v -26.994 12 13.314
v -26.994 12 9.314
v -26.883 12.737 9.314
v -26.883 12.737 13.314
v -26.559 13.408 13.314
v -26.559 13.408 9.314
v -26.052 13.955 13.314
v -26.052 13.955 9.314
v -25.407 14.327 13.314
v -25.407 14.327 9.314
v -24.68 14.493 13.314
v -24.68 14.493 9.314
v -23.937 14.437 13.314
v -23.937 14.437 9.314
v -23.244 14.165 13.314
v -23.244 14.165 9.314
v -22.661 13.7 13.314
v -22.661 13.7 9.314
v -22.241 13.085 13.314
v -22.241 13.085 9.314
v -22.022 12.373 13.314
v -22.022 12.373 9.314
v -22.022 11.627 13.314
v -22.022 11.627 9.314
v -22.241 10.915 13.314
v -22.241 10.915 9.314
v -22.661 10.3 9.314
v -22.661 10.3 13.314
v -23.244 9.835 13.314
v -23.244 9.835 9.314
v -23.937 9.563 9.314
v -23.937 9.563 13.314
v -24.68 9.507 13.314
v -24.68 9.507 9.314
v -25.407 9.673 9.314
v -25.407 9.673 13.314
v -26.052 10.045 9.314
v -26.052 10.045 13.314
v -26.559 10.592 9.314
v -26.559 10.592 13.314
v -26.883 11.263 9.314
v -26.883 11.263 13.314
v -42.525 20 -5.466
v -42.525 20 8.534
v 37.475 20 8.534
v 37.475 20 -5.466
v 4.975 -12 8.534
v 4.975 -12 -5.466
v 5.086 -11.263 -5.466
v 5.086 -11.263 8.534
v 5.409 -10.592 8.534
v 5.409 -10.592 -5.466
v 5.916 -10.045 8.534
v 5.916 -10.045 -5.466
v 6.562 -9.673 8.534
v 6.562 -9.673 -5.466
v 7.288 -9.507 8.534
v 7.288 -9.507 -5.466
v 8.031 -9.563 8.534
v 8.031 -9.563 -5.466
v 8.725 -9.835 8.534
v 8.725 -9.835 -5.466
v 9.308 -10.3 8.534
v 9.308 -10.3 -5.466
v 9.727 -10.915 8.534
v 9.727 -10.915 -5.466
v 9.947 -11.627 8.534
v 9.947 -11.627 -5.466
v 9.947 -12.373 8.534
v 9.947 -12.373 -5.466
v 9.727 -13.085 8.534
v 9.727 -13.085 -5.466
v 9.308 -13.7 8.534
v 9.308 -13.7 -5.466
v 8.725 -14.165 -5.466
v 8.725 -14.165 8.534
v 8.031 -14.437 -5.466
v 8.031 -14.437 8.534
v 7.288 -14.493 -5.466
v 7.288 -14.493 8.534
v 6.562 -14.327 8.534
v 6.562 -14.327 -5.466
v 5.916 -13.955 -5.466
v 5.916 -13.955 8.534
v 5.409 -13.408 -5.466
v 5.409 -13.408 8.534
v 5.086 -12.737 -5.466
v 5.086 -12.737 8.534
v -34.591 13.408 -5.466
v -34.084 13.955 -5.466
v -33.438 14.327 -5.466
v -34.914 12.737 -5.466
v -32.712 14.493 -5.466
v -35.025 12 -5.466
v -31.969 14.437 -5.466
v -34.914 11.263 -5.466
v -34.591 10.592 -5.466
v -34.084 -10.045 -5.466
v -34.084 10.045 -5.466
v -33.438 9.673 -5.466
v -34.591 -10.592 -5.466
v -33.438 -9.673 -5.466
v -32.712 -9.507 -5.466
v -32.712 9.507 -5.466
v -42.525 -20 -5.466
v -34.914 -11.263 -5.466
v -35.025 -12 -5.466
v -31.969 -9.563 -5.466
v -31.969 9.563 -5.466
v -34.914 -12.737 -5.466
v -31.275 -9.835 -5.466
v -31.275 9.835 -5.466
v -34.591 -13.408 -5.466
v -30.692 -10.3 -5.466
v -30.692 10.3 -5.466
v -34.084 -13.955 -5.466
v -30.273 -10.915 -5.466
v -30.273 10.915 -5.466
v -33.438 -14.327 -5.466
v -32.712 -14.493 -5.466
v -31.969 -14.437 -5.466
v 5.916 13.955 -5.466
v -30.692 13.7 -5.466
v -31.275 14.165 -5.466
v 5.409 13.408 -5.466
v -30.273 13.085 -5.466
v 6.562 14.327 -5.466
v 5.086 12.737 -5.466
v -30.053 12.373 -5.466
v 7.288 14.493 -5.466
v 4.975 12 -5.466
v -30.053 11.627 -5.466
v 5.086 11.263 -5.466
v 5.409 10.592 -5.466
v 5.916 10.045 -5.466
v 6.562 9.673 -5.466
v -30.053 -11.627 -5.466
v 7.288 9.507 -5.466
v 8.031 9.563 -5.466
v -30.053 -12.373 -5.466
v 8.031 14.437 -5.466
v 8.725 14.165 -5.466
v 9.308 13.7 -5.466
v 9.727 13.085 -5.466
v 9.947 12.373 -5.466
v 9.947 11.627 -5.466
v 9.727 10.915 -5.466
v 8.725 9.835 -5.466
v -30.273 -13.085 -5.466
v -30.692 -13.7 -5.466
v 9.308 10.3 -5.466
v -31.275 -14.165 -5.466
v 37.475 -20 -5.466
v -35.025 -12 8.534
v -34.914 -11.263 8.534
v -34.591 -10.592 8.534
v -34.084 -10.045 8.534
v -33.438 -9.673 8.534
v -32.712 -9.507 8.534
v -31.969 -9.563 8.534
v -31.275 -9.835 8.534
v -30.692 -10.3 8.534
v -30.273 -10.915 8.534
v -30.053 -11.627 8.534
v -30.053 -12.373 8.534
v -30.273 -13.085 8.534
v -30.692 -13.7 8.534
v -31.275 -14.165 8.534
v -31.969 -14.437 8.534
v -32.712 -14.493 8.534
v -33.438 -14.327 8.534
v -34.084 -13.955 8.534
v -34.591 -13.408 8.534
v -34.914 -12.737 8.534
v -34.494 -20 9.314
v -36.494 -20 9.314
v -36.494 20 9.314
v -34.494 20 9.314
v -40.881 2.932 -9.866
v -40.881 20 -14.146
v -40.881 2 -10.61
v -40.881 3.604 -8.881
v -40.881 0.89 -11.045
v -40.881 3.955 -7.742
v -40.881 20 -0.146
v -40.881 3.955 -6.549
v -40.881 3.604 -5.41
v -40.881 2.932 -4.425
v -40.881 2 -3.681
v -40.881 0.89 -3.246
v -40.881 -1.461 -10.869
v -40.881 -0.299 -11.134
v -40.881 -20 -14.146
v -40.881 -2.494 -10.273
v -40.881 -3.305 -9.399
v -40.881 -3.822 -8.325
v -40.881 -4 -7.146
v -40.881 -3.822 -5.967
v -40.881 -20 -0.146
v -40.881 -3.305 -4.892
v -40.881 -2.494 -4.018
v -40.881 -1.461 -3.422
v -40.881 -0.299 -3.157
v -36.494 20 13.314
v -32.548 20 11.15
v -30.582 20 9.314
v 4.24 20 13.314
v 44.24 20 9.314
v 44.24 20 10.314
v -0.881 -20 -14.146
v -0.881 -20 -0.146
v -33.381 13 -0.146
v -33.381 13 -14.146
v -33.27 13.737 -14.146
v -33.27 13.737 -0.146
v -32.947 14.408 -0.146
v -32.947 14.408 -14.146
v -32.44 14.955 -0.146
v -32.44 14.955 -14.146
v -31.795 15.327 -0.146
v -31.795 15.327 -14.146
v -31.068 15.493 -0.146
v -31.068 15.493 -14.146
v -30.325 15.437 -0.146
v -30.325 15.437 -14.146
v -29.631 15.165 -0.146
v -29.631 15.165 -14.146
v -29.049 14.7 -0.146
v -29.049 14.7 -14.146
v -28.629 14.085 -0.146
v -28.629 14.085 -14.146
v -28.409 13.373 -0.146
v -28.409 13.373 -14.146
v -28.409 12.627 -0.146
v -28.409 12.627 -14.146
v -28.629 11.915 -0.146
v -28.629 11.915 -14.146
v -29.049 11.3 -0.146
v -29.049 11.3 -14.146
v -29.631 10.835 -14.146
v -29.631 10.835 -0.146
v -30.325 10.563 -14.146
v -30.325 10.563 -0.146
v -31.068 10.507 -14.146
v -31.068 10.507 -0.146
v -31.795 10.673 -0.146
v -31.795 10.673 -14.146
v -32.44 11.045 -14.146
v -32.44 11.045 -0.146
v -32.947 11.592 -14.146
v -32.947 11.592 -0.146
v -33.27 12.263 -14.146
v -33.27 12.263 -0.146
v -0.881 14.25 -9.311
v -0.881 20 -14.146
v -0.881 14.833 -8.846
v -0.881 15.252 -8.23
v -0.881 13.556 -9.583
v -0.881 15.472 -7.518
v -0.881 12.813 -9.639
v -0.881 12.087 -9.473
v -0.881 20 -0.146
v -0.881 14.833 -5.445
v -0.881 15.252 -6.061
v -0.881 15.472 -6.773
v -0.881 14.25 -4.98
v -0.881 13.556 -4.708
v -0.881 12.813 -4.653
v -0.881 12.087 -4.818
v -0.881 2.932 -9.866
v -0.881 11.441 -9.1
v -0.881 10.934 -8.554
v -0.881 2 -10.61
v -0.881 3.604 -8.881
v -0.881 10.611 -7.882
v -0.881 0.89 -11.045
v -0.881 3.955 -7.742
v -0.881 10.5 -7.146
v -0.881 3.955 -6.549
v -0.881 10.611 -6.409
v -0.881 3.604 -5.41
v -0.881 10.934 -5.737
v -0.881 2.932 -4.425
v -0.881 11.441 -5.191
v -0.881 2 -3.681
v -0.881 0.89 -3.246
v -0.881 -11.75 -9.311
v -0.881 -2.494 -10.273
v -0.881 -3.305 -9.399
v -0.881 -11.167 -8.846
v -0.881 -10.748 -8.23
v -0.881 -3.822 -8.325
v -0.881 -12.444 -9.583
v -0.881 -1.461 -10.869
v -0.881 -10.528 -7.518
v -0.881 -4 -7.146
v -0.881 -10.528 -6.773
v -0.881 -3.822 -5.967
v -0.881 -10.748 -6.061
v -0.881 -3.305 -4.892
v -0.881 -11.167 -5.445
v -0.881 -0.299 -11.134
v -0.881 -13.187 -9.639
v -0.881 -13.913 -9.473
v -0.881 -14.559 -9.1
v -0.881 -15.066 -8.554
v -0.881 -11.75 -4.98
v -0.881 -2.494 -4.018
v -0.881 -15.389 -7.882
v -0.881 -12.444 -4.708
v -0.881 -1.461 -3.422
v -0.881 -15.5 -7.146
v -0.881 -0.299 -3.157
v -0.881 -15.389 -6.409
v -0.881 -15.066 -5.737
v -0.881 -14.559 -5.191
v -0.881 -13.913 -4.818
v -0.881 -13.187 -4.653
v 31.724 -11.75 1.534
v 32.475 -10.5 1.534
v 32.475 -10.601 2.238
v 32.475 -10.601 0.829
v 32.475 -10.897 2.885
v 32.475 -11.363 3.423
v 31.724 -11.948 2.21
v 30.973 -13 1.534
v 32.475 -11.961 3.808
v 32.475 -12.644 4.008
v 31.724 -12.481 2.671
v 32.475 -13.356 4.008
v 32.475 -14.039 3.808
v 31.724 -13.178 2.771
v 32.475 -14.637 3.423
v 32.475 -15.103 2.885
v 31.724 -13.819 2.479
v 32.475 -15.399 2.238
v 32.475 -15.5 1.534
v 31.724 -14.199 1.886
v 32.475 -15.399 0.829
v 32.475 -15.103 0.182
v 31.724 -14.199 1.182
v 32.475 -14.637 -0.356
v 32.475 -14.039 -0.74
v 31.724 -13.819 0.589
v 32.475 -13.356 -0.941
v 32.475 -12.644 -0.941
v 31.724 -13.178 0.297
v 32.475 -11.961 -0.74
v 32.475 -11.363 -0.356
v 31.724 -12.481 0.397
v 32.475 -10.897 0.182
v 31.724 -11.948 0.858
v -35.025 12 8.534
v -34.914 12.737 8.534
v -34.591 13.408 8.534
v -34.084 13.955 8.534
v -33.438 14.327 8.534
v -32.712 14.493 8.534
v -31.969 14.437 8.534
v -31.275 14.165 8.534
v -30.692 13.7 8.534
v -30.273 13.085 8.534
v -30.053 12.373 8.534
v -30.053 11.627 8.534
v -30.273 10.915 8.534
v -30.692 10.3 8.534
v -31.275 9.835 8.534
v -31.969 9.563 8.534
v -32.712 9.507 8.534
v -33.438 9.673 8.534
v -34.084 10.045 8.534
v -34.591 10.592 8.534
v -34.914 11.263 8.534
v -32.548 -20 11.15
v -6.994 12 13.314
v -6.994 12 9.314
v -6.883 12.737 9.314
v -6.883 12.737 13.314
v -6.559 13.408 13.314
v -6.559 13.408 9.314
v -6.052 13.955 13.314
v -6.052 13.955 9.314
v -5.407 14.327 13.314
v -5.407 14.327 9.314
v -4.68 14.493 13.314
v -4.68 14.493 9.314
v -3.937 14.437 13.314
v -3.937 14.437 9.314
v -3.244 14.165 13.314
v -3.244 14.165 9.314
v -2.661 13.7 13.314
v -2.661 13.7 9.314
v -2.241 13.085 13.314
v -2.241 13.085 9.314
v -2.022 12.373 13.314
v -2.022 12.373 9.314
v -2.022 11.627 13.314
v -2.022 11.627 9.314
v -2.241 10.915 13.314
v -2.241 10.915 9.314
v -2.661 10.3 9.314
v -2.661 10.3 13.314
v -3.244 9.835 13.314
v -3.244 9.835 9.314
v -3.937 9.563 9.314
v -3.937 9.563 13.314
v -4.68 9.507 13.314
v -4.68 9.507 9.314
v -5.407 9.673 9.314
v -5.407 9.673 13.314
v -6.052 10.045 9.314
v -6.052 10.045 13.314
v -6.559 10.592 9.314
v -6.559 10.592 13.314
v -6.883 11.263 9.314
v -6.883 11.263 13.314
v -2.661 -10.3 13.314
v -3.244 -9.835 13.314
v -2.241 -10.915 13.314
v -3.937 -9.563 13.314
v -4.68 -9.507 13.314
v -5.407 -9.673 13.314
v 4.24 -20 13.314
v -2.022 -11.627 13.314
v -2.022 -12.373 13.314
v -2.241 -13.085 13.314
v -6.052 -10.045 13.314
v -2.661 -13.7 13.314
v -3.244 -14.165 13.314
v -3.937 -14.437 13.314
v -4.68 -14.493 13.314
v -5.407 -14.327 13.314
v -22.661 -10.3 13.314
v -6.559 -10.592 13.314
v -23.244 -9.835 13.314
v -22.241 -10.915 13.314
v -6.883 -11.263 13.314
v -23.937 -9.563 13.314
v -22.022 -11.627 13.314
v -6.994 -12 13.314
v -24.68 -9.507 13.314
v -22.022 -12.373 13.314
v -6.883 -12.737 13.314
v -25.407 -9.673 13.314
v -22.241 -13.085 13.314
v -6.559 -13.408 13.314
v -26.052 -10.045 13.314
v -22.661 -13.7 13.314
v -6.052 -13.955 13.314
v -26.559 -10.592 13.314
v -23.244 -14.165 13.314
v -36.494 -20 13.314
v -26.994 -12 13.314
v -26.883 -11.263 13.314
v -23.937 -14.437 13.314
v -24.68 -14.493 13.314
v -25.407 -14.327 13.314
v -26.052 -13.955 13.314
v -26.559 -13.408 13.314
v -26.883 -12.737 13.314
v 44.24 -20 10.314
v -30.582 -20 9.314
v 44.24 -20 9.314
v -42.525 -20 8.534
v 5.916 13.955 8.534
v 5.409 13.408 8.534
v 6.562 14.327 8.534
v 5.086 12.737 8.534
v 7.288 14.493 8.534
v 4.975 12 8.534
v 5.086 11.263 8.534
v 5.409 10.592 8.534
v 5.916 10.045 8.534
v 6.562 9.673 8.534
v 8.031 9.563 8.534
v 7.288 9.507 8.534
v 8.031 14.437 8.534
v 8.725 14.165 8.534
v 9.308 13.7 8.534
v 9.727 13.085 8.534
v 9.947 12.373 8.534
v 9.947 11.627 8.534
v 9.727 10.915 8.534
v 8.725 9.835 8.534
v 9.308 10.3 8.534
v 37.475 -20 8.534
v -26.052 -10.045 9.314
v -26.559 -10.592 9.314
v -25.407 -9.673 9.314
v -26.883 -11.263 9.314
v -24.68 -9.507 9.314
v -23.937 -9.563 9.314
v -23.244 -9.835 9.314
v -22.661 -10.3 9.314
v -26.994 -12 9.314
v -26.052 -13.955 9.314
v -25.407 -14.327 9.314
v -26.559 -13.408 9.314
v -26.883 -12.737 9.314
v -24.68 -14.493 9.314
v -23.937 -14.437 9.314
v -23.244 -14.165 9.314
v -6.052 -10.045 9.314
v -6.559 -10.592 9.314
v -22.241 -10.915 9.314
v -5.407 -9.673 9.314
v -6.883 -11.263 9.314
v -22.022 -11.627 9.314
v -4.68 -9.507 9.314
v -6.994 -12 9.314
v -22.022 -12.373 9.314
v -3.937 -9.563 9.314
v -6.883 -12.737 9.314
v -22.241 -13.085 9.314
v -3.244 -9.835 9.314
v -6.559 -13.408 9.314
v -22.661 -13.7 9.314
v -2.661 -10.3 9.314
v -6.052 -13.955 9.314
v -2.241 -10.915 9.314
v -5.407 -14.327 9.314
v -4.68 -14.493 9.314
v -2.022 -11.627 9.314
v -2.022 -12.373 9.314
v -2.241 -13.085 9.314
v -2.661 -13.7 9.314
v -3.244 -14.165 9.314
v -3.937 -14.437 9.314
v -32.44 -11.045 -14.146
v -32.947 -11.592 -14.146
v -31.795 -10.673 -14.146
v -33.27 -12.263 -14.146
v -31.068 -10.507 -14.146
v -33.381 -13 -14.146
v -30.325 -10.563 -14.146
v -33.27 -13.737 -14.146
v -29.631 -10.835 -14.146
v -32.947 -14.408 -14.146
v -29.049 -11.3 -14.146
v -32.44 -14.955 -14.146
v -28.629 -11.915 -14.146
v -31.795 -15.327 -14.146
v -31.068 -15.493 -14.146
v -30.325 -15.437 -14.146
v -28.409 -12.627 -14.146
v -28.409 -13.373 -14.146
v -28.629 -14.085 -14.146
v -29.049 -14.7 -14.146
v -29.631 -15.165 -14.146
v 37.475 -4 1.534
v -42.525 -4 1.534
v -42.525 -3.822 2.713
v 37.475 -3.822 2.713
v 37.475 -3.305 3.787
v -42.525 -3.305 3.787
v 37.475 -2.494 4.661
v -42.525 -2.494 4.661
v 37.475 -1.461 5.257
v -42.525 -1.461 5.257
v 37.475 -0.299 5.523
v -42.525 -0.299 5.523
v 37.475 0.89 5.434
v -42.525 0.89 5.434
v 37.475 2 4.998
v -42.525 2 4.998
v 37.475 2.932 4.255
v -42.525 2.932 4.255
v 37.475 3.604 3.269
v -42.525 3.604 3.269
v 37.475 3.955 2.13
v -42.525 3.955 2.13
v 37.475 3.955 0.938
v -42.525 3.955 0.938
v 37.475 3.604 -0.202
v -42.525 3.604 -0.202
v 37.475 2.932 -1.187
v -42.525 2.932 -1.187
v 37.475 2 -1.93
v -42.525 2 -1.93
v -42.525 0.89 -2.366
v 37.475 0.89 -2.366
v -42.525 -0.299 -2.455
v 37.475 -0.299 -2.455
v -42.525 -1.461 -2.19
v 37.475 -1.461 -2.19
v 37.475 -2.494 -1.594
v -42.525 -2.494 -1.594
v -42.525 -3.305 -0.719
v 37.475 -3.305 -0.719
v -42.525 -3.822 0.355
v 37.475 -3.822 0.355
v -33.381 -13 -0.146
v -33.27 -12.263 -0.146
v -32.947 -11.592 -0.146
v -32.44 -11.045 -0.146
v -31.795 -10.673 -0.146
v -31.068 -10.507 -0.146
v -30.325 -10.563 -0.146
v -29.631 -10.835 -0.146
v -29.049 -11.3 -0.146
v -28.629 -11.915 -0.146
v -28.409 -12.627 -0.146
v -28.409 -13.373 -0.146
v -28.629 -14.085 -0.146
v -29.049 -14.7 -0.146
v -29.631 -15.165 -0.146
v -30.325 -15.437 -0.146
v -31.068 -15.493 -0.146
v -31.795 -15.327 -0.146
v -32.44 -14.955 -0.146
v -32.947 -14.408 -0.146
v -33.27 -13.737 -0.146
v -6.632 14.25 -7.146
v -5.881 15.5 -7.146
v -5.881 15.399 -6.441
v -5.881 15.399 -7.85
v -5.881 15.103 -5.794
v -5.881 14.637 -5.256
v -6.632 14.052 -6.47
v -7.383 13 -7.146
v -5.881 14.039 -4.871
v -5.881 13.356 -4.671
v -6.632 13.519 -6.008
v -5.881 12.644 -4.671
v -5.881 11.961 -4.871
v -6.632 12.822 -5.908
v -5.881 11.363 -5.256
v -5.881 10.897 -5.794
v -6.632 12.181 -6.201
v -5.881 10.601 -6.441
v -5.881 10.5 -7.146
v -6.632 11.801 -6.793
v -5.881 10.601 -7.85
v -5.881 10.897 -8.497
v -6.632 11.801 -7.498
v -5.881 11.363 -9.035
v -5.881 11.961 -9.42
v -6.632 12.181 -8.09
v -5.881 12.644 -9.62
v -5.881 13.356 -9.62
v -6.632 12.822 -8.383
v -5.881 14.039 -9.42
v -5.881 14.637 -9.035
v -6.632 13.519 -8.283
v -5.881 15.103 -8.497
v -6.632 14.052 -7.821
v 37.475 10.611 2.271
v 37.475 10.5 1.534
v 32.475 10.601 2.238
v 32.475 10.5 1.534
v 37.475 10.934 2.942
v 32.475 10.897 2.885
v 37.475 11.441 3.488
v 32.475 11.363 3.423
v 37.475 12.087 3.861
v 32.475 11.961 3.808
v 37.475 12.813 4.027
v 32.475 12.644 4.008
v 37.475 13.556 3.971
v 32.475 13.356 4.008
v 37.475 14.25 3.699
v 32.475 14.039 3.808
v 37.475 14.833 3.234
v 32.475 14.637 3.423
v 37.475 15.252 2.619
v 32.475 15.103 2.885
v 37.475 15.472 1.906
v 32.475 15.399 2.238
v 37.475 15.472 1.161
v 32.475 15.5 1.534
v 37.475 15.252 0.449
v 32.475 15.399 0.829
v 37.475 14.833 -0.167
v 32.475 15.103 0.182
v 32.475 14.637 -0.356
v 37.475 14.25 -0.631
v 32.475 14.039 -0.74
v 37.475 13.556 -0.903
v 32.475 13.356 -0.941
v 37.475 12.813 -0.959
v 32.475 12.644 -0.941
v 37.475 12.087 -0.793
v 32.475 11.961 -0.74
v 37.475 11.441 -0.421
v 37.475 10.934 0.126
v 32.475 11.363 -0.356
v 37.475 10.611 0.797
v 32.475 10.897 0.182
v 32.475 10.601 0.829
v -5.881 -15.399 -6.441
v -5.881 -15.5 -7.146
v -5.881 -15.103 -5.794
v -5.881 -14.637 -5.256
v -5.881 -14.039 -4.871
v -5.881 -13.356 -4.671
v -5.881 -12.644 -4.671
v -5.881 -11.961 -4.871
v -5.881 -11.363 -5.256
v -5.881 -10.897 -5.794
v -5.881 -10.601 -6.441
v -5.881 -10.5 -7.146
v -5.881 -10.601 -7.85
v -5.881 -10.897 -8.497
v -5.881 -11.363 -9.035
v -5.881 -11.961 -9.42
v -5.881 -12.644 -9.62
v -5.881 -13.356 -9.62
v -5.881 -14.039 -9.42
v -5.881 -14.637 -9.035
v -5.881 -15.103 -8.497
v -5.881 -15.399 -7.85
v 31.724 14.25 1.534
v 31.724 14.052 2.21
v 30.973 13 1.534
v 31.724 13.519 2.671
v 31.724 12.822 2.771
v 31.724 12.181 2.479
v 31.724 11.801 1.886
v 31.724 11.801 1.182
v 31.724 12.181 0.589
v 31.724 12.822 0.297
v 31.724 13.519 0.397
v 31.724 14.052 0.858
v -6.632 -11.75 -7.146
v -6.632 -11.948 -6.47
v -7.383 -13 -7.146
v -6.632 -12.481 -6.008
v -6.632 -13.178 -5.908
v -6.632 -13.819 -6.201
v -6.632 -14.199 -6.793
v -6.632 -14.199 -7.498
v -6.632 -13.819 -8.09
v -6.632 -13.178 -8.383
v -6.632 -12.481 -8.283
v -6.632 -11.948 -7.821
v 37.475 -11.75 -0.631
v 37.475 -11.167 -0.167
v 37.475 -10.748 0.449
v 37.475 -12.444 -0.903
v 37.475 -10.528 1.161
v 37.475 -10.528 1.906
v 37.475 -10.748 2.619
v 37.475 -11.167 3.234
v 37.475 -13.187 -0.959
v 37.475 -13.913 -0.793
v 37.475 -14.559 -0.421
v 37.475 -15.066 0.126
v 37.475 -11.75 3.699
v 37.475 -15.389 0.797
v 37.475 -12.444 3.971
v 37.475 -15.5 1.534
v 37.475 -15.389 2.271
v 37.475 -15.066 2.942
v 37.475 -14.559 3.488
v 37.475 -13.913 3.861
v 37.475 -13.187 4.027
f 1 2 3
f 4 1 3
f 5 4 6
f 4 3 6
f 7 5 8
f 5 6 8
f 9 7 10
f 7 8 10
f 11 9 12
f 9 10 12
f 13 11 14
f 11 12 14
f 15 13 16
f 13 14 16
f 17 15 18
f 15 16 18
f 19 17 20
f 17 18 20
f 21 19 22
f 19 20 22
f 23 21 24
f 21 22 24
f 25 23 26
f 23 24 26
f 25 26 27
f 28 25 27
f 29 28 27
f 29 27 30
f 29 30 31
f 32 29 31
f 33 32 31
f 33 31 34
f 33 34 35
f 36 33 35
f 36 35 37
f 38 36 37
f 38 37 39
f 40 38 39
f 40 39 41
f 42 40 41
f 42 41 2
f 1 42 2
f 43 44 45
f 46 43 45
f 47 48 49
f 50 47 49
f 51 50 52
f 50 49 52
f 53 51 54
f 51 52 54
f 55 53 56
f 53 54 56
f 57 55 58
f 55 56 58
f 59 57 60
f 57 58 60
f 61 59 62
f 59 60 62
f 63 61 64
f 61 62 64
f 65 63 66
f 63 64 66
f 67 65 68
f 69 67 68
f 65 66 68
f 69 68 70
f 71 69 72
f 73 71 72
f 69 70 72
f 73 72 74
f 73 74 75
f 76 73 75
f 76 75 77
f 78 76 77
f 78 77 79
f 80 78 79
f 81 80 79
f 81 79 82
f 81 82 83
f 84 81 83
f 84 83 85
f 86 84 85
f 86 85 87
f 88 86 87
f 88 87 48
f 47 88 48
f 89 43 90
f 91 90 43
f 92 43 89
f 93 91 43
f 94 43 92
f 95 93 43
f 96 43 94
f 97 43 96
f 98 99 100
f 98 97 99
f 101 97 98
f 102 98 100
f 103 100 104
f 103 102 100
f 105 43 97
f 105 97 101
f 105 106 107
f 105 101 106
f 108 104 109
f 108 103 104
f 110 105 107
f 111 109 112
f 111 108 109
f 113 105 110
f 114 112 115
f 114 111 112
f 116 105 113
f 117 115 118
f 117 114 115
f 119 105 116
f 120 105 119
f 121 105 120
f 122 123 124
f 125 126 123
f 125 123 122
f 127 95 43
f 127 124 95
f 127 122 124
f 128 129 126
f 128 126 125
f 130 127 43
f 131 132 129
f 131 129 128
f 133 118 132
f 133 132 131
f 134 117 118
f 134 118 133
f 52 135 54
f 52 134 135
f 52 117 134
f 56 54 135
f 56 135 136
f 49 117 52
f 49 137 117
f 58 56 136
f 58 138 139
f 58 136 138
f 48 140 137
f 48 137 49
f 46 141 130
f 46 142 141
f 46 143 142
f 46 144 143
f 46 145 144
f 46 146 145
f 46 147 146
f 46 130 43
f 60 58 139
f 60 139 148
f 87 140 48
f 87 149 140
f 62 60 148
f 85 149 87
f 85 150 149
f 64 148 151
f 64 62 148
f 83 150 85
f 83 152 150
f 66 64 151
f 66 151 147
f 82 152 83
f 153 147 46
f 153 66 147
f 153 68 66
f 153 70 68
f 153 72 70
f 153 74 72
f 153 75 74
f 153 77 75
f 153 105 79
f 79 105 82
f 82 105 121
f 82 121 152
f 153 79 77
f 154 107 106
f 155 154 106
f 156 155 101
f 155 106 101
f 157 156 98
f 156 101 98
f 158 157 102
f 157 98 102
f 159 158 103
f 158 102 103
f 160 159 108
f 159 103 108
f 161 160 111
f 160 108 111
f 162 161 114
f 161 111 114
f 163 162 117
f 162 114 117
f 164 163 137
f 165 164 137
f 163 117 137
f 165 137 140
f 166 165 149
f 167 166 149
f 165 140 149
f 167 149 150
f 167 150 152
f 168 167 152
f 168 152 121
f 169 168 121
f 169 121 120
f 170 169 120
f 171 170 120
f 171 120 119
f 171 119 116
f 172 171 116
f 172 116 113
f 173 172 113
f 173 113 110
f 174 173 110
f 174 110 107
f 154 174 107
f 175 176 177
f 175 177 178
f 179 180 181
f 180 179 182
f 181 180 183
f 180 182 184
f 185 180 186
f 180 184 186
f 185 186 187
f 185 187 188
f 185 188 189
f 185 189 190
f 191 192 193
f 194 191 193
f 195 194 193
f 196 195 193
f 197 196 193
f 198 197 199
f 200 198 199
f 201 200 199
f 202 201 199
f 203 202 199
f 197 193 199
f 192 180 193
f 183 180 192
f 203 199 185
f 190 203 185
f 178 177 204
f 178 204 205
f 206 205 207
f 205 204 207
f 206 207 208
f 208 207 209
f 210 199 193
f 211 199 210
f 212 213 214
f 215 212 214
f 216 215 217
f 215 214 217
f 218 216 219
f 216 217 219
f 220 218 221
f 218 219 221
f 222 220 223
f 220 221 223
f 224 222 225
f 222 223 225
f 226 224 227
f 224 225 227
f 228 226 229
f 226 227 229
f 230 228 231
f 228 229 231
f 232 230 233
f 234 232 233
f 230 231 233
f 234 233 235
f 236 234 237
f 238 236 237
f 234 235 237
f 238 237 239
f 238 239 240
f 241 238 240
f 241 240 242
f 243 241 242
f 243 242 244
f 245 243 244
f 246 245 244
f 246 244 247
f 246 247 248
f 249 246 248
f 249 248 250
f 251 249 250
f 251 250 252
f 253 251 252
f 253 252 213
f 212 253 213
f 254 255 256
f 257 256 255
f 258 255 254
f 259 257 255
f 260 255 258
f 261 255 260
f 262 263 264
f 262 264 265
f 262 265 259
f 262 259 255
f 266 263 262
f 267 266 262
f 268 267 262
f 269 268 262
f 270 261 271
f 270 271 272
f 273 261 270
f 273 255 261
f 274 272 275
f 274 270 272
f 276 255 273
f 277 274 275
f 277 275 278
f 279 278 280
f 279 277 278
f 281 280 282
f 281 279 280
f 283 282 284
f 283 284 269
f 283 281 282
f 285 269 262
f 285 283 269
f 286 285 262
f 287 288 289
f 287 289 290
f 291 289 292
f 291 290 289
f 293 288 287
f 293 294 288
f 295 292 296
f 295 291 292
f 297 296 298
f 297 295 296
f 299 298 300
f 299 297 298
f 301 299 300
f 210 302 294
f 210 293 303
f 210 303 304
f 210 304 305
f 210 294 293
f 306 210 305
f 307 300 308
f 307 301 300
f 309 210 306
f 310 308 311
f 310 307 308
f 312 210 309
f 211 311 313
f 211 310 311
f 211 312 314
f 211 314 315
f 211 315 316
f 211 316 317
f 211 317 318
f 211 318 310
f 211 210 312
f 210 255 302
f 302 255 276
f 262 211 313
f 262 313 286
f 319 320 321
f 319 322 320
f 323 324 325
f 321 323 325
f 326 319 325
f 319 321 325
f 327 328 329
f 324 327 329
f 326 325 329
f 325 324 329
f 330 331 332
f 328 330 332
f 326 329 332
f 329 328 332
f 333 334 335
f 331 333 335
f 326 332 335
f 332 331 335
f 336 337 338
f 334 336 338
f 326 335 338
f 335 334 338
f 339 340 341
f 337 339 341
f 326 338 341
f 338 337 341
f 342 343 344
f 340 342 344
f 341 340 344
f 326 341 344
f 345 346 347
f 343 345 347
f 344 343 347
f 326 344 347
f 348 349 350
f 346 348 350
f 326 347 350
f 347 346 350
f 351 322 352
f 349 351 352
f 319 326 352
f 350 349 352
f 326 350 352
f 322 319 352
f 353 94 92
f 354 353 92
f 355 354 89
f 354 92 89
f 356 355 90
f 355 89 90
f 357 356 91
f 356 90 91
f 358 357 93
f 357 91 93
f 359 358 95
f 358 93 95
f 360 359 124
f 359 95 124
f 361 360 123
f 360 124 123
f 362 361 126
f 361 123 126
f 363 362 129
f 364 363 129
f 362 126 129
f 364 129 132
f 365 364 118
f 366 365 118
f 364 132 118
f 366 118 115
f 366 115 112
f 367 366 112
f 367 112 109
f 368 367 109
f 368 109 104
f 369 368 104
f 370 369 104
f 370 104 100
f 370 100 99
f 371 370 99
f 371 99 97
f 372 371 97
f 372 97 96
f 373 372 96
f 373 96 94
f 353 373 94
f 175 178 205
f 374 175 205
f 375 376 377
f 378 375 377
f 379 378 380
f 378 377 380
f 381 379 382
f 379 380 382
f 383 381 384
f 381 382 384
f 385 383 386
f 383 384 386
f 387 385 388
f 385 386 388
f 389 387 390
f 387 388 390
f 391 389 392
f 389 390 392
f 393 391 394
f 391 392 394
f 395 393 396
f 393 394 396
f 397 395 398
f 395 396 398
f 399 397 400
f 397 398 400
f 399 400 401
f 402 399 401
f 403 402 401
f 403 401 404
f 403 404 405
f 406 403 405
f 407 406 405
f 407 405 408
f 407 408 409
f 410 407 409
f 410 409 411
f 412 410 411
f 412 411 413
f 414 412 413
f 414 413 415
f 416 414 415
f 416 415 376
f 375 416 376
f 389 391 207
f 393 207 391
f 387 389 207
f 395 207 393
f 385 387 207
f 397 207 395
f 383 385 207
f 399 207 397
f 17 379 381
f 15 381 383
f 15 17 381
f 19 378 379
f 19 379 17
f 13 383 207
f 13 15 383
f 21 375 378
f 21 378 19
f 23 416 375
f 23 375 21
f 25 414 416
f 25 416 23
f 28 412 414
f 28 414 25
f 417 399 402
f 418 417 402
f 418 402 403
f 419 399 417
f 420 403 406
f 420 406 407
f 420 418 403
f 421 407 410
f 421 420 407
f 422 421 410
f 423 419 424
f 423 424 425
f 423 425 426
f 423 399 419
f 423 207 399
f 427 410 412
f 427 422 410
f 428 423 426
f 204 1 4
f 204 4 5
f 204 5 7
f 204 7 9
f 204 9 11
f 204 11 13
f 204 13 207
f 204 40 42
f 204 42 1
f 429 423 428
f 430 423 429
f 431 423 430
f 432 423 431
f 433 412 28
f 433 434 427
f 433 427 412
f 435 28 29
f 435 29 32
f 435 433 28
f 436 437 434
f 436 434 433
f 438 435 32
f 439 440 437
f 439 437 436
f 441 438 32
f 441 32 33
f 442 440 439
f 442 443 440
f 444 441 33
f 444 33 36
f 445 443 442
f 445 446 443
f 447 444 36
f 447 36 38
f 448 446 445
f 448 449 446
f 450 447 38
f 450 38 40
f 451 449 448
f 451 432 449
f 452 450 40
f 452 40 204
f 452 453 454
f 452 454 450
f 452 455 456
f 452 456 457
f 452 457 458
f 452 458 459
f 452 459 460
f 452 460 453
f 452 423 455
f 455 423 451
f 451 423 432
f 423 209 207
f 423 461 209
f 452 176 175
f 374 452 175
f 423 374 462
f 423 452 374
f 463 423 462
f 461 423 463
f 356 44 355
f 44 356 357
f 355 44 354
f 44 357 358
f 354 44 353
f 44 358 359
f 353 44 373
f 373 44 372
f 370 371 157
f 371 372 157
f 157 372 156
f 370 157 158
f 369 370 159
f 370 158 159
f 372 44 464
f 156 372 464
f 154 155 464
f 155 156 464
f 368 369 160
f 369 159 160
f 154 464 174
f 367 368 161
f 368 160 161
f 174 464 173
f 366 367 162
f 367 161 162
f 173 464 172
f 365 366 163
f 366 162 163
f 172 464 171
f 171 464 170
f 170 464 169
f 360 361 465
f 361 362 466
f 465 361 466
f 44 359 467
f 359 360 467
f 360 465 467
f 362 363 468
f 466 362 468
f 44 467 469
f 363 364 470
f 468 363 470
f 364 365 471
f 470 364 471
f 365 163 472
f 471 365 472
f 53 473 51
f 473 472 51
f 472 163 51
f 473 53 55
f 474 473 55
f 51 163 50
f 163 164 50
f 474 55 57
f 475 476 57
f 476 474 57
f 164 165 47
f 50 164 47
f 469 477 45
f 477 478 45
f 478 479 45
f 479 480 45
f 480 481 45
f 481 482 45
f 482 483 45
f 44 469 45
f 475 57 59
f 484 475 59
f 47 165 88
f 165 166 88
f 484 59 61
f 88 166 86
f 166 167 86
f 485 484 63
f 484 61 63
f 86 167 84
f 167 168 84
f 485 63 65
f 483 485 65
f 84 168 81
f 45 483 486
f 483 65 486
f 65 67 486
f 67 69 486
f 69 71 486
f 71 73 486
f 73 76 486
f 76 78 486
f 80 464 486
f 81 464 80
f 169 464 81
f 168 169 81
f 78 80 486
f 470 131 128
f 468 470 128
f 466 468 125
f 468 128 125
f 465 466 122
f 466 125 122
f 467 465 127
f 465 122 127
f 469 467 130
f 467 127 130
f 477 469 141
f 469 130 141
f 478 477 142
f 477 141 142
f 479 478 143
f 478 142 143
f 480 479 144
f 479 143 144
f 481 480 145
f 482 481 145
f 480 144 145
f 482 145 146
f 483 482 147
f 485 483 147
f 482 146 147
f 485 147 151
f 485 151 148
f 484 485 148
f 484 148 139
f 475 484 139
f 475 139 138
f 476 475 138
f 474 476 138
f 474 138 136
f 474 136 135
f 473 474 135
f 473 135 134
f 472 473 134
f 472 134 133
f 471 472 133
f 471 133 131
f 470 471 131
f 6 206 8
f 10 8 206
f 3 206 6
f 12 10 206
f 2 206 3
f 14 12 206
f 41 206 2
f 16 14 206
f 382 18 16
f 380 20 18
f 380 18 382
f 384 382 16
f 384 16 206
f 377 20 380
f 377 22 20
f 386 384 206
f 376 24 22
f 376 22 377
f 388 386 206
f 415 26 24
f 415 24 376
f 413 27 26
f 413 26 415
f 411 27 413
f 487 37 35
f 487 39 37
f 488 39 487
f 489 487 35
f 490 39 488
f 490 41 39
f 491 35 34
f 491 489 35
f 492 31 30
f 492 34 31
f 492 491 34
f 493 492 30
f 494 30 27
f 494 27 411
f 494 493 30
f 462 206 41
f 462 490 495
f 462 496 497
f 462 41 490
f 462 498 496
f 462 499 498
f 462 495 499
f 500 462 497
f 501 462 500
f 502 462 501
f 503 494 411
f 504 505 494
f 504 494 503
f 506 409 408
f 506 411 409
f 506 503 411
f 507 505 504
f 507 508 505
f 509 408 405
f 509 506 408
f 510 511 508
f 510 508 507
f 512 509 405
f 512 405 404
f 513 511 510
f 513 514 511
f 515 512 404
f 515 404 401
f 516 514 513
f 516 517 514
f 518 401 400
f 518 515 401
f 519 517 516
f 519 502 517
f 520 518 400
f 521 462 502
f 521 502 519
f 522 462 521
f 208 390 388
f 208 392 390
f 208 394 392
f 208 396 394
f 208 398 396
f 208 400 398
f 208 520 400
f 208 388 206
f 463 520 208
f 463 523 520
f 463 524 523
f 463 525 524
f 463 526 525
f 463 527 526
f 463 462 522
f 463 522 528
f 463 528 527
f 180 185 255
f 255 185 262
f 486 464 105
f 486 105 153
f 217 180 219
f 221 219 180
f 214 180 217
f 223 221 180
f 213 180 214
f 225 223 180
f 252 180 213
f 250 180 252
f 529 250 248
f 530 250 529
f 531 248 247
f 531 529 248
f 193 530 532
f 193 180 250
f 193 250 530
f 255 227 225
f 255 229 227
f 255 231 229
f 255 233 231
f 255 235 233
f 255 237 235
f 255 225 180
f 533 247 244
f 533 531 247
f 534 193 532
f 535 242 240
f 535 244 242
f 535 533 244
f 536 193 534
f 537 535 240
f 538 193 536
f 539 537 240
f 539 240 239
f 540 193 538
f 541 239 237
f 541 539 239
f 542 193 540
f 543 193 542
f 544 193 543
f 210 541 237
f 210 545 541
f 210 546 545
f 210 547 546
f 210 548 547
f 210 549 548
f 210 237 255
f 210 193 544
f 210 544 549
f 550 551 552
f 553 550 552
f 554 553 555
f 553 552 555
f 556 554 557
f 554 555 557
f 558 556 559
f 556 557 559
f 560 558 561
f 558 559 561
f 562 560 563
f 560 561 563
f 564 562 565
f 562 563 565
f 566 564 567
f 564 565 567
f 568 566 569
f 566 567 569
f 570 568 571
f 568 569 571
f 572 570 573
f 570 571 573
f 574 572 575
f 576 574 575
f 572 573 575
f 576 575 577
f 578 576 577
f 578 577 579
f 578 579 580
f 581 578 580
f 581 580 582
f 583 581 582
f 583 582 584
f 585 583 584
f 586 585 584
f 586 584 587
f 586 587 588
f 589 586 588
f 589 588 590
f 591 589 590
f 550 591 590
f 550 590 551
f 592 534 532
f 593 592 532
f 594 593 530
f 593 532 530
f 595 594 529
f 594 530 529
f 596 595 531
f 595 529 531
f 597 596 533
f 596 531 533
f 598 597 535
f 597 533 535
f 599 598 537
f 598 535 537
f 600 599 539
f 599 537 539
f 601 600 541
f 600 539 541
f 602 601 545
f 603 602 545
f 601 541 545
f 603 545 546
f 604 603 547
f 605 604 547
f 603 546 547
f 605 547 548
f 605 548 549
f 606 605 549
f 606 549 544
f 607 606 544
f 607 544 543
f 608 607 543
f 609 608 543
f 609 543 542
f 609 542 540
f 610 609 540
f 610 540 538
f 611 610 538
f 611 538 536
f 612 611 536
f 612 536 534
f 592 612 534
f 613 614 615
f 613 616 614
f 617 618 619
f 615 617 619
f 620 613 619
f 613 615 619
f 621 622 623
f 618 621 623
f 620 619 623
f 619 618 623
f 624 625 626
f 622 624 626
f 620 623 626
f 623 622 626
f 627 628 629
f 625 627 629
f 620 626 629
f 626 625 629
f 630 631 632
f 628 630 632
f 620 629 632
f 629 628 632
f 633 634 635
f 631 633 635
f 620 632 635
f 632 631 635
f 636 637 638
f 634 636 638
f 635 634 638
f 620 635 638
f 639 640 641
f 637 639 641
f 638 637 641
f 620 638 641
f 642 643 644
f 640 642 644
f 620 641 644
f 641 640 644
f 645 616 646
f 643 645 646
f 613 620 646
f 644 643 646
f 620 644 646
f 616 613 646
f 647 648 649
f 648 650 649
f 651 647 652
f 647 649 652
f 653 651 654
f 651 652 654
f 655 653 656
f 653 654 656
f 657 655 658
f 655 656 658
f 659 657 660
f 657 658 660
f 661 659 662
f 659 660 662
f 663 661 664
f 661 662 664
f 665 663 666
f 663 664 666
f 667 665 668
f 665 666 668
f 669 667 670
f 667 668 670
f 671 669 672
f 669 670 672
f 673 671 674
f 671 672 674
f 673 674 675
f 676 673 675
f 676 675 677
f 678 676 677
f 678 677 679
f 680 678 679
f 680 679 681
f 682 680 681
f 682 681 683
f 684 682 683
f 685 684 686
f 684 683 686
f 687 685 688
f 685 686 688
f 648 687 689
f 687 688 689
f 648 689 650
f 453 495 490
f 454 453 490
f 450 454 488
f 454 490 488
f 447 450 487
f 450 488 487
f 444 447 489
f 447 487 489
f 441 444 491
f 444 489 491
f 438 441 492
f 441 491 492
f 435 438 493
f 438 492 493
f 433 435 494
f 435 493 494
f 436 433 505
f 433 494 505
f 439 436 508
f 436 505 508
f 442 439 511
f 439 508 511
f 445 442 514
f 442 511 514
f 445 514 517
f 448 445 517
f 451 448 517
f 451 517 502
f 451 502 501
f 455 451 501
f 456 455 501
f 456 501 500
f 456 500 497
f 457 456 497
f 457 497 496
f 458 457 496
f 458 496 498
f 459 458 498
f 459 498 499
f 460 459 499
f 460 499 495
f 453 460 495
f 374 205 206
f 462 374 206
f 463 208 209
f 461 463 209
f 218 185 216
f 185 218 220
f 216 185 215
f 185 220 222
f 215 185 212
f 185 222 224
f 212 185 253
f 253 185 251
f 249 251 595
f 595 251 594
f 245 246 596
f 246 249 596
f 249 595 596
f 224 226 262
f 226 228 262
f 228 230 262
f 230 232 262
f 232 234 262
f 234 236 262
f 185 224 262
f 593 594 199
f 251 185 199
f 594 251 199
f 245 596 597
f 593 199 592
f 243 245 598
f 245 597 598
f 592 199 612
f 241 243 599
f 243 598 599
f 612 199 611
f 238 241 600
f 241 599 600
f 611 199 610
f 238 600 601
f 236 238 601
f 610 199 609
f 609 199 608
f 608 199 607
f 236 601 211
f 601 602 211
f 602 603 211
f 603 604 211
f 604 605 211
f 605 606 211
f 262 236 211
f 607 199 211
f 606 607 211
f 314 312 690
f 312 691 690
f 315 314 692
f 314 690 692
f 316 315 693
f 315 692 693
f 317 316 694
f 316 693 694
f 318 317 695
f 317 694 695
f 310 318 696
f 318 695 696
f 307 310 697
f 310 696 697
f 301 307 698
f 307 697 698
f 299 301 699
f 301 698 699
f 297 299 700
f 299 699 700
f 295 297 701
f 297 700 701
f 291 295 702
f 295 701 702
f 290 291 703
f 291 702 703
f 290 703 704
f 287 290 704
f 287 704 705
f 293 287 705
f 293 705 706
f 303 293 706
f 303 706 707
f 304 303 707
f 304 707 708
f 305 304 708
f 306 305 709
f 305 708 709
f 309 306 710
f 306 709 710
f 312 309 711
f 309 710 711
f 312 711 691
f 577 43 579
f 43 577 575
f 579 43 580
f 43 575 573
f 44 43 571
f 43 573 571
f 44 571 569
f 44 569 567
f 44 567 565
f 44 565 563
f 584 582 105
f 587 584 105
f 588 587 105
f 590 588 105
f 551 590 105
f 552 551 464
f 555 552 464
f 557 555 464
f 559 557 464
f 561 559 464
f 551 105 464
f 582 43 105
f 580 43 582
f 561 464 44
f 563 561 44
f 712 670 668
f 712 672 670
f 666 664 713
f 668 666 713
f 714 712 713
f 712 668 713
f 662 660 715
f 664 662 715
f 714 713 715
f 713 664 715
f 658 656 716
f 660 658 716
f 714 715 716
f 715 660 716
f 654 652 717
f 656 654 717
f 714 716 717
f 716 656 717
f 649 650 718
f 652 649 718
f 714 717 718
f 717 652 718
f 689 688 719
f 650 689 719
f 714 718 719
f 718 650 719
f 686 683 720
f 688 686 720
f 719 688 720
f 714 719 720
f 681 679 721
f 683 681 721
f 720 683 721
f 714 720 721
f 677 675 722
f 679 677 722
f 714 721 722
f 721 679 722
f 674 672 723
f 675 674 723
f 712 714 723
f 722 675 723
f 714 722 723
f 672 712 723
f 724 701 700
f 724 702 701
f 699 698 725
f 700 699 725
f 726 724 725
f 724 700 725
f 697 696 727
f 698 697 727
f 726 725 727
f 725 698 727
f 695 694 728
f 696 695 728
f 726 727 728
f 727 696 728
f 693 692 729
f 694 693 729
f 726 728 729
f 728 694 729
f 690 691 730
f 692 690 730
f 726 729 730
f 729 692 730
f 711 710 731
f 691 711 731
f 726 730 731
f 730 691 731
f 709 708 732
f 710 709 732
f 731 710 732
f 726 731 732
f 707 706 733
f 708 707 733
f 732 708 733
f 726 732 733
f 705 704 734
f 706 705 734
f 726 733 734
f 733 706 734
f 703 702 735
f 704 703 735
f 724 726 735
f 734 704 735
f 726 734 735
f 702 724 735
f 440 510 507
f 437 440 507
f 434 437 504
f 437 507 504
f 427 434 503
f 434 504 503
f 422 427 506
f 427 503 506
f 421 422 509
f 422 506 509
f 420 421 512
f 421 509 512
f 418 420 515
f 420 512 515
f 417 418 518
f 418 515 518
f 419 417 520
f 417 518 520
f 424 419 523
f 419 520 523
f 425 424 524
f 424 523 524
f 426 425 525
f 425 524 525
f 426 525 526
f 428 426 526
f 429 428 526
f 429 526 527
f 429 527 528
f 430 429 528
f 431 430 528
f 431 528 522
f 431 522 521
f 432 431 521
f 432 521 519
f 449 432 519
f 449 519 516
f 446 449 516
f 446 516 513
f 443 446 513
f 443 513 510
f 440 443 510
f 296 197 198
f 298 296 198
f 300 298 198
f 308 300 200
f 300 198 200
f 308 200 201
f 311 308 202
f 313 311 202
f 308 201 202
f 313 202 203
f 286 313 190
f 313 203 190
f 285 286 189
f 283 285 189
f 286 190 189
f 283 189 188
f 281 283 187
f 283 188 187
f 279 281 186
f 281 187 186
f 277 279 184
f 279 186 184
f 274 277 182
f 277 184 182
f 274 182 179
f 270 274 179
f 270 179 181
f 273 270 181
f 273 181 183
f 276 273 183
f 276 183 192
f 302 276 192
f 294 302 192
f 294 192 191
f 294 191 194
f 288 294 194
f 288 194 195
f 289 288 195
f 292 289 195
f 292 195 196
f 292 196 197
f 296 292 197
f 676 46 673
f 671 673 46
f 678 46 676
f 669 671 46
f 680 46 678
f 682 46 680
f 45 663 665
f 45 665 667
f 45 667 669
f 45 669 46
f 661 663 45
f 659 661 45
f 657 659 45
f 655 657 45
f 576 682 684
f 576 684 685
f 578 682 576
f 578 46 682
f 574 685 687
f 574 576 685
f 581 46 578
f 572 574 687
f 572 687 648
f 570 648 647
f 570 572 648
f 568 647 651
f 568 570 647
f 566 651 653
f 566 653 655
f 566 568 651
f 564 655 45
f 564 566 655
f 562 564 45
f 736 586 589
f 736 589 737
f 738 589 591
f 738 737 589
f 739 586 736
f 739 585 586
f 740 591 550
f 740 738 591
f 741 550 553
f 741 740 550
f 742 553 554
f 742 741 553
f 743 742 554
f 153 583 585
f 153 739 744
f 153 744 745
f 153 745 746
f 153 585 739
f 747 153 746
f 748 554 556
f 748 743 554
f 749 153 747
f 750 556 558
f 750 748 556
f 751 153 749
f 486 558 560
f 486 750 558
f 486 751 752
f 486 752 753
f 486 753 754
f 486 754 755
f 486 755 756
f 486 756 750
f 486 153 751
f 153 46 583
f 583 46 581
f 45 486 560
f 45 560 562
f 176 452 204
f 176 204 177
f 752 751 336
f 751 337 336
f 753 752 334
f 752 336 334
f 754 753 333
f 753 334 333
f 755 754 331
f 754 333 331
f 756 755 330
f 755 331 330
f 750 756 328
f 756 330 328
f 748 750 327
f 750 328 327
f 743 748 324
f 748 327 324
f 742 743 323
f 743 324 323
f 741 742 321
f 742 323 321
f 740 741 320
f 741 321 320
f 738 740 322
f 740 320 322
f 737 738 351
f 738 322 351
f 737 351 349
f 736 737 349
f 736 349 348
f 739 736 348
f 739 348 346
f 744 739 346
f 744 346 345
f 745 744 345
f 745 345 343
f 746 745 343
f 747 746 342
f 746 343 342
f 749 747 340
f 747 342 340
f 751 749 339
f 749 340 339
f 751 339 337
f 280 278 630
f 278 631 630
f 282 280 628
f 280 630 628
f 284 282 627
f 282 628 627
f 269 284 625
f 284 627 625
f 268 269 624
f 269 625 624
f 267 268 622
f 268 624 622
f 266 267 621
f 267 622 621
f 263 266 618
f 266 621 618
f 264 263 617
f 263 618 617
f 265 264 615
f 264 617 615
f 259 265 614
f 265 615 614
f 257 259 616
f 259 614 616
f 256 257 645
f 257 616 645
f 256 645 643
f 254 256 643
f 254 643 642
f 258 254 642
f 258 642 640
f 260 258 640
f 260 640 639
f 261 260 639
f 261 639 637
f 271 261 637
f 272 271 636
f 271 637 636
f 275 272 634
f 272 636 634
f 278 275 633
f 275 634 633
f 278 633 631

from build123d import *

# Parameters (mm, degrees)
F1_DEPTH  = 20
F3_D      = 5
F4_W      = 40
F4_H      = 14
F5_DEPTH  = 20
F7_D      = 5
F9_D      = 8
F10_W     = 80
F10_H     = 14
F11_DEPTH = 20
F13_D     = 5
F15_D     = 8
F17_D     = 5
F17_DEPTH = 5
F17_TIP   = 1.5021515476
F19_D     = 5
F19_DEPTH = 5
F19_TIP   = 1.5021515476


with BuildPart() as f1:
    # F0 (on Front) → F1 (new body, symmetric)
    with BuildSketch(Plane.XZ):
        Polygon((4.2404492051, 13.3139517168), (-36.4936559652, 13.3139517168), (-36.4936559652, 9.3139517168), (-34.4936559652, 9.3139517168), (-32.5477160513, 11.1502381042), (-30.5823739618, 9.3139517168), (4.2404492051, 9.3139517168), align=None)
        Polygon((44.2404492051, 10.3139517168), (4.2404492051, 13.3139517168), (4.2404492051, 9.3139517168), (44.2404492051, 9.3139517168), align=None)
    extrude(amount=F1_DEPTH, both=True)

    # F3 (through all)
    with Locations(Plane.XY.offset(13.3139517168)):
        with Locations((-24.4936559652, 12), (-4.4936559652, 12), (-24.4936559652, -12), (-4.4936559652, -12)):
            Hole(F3_D / 2)


with BuildPart() as f5:
    # F4 (on Front) → F5 (new body, symmetric)
    with BuildSketch(Plane.XZ):
        with Locations((-20.8811860066, -7.1455224962)):
            Rectangle(F4_W, F4_H)
    extrude(amount=F5_DEPTH, both=True)

    # F7 (through all)
    with Locations(Plane.XY.offset(-0.1455224962)):
        with Locations((-30.8811860066, 13), (-30.8811860066, -13)):
            Hole(F7_D / 2)

    # F9 (through all)
    with Locations(Plane.YZ.offset(-0.8811860066)):
        with Locations((0, -7.1455224962)):
            Hole(F9_D / 2)

    # F17
    with Locations(Plane.YZ.offset(-0.8811860066)):
        with Locations((-13, -7.1455224962), (13, -7.1455224962)):
            Hole(F17_D / 2, depth=F17_DEPTH)
            with Locations((0, 0, -(F17_DEPTH + F17_TIP / 2))):  # 118° drill point
                Cone(0, F17_D / 2, F17_TIP, mode=Mode.SUBTRACT)


with BuildPart() as f11:
    # F10 (on Front) → F11 (new body, symmetric)
    with BuildSketch(Plane.XZ):
        with Locations((-2.5250008702, 1.5338233374)):
            Rectangle(F10_W, F10_H)
    extrude(amount=F11_DEPTH, both=True)

    # F13 (through all)
    with Locations(Plane.XY.offset(8.5338233374)):
        with Locations((-32.5250008702, 12), (-32.5250008702, -12), (7.4749991298, -12), (7.4749991298, 12)):
            Hole(F13_D / 2)

    # F15 (through all)
    with Locations(Plane.YZ.offset(37.4749991298)):
        with Locations((0, 1.5338233374)):
            Hole(F15_D / 2)

    # F19
    with Locations(Plane.YZ.offset(37.4749991298)):
        with Locations((-13, 1.5338233374), (13, 1.5338233374)):
            Hole(F19_D / 2, depth=F19_DEPTH)
            with Locations((0, 0, -(F19_DEPTH + F19_TIP / 2))):  # 118° drill point
                Cone(0, F19_D / 2, F19_TIP, mode=Mode.SUBTRACT)


solid = Compound([f1.part, f5.part, f11.part])
